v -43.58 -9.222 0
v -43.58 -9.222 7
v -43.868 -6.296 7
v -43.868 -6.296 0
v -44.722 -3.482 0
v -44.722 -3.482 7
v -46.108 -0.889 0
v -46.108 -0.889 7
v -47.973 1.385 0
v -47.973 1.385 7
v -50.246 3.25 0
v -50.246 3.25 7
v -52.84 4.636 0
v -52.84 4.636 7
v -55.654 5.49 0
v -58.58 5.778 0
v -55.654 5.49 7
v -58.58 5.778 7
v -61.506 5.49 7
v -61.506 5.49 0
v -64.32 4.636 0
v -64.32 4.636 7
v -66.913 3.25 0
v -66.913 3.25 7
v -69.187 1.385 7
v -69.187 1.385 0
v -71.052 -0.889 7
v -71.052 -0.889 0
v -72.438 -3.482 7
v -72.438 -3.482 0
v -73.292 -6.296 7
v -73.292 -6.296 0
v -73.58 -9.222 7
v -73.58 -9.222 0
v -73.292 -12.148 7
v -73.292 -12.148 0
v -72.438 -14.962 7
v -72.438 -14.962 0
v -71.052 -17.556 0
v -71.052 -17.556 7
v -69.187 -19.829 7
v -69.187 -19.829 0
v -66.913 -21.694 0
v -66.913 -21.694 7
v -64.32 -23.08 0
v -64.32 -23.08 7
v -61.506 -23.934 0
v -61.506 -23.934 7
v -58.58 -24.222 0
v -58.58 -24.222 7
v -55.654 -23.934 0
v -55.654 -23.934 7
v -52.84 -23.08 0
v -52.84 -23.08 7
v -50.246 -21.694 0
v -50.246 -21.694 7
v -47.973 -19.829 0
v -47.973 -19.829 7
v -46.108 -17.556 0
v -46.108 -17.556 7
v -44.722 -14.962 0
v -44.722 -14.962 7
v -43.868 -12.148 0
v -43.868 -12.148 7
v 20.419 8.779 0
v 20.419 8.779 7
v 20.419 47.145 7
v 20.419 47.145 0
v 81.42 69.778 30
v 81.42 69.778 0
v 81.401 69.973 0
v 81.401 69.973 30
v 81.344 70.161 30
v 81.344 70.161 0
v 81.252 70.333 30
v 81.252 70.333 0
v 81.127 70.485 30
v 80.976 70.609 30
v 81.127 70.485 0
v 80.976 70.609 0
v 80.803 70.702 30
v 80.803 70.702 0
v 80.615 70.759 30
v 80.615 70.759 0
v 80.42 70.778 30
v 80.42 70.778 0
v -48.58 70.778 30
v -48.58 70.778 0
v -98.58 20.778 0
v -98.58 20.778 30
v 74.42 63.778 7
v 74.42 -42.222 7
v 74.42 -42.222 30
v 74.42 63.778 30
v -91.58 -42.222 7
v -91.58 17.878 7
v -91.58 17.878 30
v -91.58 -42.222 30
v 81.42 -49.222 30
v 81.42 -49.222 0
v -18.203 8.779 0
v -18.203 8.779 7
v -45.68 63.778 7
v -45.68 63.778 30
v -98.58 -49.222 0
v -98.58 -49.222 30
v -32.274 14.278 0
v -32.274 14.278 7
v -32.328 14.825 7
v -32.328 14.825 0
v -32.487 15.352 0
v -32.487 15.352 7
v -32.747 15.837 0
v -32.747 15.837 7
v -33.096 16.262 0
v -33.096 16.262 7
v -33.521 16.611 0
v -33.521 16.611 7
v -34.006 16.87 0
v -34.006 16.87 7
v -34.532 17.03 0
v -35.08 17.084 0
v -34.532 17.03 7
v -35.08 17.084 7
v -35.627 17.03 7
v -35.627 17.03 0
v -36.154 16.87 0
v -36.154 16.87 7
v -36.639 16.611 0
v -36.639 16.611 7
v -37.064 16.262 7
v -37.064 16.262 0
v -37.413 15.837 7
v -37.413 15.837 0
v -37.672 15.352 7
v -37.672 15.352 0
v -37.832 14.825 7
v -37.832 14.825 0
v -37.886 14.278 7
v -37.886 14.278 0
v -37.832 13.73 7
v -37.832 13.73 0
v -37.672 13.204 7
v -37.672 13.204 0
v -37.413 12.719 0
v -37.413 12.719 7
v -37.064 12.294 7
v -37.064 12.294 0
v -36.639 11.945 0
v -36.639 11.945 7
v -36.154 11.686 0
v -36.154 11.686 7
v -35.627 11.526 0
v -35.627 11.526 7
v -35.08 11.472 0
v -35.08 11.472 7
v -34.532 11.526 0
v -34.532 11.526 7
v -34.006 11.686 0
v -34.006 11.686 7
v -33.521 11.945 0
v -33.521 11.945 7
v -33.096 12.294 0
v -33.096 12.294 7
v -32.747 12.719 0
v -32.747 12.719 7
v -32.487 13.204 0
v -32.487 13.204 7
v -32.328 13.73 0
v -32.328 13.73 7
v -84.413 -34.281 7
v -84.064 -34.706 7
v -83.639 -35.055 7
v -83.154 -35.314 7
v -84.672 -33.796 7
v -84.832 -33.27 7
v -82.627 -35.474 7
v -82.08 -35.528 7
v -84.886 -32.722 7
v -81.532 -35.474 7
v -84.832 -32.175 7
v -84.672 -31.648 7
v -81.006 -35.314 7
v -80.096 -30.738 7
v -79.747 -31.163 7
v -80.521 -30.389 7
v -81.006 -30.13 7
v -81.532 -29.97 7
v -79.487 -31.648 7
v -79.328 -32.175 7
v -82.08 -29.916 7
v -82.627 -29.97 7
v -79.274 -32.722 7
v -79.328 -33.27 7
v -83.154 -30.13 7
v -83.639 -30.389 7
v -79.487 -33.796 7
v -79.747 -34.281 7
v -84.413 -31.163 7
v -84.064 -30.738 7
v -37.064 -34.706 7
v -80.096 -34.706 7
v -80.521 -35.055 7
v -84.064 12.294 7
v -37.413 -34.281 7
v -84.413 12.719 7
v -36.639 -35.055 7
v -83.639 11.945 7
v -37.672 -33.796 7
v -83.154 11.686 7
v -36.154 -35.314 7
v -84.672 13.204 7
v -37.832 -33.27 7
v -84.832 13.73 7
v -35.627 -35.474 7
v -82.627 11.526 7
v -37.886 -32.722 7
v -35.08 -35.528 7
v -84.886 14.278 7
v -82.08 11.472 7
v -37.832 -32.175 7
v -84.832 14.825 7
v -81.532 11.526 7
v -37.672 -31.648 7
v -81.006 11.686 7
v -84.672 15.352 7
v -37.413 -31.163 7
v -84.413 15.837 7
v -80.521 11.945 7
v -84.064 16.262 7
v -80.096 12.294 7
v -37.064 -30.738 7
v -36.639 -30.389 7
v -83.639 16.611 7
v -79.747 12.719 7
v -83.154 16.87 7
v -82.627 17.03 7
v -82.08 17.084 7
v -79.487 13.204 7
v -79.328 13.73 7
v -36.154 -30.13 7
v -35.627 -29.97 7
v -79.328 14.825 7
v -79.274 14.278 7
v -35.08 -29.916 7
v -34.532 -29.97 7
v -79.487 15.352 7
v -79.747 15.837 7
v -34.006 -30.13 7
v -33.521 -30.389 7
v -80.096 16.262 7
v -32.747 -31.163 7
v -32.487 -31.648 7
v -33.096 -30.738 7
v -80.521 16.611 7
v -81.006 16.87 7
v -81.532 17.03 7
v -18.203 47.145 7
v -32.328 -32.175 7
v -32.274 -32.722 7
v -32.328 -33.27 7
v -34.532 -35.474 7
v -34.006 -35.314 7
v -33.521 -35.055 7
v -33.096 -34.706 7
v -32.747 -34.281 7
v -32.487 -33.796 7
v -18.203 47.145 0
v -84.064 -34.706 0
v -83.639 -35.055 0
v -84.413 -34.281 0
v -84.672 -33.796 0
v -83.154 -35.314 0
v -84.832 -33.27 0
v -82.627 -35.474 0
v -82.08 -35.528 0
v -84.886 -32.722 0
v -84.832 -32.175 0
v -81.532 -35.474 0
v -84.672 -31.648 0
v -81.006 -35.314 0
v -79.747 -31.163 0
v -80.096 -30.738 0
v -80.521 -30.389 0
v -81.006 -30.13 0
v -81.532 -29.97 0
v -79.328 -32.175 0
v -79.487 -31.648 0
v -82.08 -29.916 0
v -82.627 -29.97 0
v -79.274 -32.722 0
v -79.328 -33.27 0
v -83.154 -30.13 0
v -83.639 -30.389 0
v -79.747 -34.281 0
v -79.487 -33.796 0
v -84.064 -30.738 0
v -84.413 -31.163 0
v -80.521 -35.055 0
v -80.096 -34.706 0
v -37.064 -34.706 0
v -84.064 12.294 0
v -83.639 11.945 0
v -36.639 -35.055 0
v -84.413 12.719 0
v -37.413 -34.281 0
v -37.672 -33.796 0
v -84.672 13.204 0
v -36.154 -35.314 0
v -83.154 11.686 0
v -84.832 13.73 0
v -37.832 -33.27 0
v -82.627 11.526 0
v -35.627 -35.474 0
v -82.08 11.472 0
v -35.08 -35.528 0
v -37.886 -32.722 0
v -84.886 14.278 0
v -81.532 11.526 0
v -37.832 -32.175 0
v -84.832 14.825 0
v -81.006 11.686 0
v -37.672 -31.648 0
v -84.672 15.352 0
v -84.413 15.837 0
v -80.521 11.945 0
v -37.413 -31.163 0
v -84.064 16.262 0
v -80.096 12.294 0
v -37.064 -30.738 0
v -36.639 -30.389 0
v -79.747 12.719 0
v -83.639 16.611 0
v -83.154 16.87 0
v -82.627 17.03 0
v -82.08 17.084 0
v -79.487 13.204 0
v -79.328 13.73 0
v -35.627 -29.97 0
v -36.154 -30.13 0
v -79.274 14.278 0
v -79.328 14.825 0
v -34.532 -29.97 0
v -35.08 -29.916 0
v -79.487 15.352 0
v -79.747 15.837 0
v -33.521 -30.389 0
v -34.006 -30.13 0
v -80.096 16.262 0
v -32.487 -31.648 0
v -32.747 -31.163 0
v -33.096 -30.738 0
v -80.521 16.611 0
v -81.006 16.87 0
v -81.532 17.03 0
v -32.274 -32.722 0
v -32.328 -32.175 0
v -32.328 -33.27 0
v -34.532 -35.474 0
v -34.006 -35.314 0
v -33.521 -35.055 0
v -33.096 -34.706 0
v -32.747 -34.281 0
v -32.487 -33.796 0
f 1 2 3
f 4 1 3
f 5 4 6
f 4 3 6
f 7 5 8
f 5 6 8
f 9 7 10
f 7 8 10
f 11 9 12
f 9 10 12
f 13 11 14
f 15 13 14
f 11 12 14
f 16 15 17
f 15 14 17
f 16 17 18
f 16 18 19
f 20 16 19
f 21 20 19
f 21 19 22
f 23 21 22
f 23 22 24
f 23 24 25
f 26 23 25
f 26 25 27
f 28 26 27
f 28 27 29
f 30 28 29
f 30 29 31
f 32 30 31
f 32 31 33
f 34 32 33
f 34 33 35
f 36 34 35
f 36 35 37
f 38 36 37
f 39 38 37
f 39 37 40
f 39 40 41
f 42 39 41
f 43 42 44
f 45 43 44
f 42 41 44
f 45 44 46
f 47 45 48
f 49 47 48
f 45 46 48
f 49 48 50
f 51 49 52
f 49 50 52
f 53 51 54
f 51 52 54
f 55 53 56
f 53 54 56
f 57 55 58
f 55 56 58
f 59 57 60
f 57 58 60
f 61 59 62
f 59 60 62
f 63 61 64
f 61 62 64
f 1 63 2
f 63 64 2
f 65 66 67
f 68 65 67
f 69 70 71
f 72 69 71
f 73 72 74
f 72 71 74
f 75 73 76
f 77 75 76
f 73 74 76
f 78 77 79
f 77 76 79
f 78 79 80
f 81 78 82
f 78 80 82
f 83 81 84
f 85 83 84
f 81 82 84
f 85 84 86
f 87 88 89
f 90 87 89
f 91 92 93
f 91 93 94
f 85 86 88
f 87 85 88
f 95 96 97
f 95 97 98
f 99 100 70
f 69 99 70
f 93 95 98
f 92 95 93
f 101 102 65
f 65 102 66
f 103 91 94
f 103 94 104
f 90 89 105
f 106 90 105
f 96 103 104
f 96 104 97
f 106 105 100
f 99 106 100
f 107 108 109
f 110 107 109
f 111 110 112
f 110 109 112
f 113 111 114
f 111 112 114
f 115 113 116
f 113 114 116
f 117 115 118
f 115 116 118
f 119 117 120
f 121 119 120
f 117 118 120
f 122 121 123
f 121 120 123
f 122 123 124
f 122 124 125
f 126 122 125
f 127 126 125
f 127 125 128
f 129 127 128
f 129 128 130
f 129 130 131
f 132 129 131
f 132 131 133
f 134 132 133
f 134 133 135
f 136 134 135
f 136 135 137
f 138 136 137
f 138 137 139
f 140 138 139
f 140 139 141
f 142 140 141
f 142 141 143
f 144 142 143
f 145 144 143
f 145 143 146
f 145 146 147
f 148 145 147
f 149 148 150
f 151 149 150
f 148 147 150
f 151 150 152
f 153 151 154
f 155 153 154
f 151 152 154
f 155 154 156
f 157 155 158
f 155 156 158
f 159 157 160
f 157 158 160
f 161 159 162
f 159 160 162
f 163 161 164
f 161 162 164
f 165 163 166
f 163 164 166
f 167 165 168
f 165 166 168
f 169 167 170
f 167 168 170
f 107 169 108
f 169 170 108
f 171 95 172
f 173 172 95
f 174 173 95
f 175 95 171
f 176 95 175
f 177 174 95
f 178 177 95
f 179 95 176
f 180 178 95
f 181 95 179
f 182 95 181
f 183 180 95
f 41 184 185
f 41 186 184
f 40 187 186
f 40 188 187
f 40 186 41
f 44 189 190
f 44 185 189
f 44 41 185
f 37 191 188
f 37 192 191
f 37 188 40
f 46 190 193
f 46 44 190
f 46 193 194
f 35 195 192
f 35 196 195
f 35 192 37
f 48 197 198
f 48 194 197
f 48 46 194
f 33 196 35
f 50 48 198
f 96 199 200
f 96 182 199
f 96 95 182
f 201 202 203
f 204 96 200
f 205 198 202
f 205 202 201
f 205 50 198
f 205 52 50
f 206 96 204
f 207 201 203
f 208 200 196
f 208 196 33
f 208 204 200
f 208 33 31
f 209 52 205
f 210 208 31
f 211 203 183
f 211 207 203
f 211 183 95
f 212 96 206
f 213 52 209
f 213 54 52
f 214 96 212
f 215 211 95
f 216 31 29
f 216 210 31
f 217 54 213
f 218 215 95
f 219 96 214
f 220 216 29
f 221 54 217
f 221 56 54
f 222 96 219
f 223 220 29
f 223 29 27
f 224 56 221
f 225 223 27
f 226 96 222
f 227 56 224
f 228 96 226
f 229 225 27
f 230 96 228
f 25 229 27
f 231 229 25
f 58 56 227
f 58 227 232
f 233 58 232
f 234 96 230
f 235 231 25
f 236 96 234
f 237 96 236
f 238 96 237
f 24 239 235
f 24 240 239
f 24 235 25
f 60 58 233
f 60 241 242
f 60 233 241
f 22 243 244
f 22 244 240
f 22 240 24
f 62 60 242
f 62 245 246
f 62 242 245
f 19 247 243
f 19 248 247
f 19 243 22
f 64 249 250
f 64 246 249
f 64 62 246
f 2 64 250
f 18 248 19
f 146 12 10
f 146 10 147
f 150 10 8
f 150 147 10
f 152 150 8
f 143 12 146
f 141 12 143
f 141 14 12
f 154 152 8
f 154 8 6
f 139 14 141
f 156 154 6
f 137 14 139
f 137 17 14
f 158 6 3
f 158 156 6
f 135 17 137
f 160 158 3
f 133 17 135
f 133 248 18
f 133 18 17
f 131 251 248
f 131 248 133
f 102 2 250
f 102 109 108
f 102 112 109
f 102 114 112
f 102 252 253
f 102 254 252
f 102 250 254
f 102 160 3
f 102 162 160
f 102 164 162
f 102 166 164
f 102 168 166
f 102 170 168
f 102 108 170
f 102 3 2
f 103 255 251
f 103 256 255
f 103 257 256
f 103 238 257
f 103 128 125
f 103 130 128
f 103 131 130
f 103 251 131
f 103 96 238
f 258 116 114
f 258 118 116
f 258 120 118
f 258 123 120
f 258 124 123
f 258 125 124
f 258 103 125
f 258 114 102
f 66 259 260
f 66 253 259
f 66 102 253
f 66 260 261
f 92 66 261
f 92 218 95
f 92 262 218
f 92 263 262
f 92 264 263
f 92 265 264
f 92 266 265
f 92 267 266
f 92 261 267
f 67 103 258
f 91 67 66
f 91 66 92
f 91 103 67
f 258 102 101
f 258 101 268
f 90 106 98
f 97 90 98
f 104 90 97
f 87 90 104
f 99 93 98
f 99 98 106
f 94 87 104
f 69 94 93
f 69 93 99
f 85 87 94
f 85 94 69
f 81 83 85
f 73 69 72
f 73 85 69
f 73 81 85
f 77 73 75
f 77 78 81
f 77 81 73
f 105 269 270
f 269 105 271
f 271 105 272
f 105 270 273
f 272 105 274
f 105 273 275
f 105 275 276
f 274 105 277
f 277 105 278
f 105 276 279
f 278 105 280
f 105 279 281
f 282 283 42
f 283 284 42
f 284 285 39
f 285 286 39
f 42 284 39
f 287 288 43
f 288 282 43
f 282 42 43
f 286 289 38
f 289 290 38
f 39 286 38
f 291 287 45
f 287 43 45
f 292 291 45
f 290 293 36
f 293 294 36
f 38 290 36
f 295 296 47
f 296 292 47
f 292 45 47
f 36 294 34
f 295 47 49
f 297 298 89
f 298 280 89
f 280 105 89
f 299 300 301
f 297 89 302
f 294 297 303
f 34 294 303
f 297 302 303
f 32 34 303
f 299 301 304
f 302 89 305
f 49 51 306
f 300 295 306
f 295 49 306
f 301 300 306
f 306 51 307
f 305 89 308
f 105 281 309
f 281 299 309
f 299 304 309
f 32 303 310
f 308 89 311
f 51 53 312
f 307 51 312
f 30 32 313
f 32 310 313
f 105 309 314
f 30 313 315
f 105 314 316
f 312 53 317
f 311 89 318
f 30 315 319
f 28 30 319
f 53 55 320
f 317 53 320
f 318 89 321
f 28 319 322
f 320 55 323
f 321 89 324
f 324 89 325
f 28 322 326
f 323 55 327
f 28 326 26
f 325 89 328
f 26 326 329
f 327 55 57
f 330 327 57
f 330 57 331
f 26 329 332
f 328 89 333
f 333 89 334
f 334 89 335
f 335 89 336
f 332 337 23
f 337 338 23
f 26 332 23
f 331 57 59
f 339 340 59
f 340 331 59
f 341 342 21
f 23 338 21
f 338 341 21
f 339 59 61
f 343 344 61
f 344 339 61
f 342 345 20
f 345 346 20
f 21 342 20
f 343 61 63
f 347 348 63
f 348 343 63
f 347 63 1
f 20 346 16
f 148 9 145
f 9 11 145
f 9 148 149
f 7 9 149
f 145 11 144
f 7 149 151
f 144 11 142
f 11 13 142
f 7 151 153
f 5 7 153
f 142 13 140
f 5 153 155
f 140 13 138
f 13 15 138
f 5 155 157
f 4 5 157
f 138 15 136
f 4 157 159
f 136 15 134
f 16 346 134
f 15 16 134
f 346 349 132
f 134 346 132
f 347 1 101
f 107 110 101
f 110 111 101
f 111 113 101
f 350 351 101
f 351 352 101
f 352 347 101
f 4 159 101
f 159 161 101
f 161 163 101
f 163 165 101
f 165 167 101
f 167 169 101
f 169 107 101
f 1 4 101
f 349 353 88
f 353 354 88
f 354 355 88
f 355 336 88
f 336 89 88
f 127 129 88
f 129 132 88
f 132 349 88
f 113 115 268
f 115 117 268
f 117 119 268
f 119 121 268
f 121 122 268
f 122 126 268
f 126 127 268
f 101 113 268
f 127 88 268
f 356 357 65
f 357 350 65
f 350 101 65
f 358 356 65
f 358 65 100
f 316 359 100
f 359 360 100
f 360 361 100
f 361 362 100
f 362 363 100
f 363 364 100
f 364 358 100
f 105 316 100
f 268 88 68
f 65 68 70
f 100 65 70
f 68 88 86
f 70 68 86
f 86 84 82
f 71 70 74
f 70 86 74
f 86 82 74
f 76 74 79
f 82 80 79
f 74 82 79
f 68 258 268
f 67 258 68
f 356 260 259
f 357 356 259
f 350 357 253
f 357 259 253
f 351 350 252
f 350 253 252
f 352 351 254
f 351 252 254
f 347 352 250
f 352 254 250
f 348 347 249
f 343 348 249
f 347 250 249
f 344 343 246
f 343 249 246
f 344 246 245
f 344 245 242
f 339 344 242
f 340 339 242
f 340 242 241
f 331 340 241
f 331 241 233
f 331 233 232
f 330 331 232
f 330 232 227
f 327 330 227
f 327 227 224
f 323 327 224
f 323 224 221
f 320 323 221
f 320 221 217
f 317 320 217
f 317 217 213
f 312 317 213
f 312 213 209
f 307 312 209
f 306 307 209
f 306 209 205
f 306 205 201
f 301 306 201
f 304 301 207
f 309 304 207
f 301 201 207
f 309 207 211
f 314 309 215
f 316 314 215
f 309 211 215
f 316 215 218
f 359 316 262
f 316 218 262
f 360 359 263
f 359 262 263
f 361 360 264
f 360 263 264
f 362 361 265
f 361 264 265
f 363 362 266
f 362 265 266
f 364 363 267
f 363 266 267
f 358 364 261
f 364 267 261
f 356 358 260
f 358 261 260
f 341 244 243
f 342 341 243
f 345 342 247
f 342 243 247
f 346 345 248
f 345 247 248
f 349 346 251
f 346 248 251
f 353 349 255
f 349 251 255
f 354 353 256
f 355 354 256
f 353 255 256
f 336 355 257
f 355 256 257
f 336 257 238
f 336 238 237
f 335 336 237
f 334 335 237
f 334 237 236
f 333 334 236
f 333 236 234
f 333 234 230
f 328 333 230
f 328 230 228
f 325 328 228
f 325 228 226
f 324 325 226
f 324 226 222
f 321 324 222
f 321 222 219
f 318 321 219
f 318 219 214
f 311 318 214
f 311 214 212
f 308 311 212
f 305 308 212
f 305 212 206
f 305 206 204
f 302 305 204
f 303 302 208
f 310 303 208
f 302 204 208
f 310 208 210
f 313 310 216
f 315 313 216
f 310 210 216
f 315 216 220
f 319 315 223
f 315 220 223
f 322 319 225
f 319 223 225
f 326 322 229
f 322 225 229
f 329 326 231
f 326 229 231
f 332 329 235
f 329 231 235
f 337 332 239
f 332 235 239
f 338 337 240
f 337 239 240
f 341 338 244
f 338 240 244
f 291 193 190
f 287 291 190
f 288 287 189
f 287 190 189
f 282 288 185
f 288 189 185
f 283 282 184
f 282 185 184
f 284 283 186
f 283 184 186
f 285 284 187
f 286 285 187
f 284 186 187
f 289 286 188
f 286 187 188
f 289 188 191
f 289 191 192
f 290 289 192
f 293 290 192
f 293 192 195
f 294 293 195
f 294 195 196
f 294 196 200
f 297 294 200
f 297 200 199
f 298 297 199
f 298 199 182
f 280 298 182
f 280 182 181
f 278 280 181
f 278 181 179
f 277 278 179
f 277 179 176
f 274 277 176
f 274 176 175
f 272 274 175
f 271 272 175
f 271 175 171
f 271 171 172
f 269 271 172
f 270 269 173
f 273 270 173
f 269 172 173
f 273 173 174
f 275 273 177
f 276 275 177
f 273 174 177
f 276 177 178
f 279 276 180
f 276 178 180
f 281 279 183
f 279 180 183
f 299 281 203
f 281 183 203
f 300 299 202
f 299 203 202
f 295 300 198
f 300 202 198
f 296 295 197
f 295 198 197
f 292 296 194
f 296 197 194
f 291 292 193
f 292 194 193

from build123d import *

# Parameters (mm, degrees)
BOSS_EXTRUDE1_DEPTH  = 30
SHELL1_T             = -7
SKETCH2_R            = 15
CUT_EXTRUDE1_DEPTH   = 20
SKETCH3_R            = 2.805999004
CUT_EXTRUDE2_DEPTH   = 20
LPATTERN1_COUNT      = 2
LPATTERN1_PITCH      = 47
LPATTERN1_COUNT_DIR2 = 2
LPATTERN1_PITCH_DIR2 = 47
SKETCH4_W            = 38.622861656
SKETCH4_H            = 38.365375911
CUT_EXTRUDE3_DEPTH   = 20


with BuildPart() as part:
    # Sketch1 → Boss-Extrude1 (new body)
    with BuildSketch(Plane.XY):
        with BuildLine():
            Line((-48.579903717, 70.777906396), (-98.579903717, 20.777906396))
            Line((-98.579903717, 20.777906396), (-98.579903717, -49.222093604))
            Line((-98.579903717, -49.222093604), (81.420096283, -49.222093604))
            Line((81.420096283, -49.222093604), (81.420096283, 69.777906396))
            ThreePointArc((81.420096283, 69.777906396), (81.127203064, 70.485013177), (80.420096283, 70.777906396))
            Line((80.420096283, 70.777906396), (-48.579903717, 70.777906396))
        make_face()
    extrude(amount=BOSS_EXTRUDE1_DEPTH)

    # Shell1
    shell1_openings = [part.faces().sort_by_distance(p)[0] for p in [
        (-4.076298463, 8.11549528, 30),
    ]]
    offset(amount=SHELL1_T, openings=shell1_openings, kind=Kind.INTERSECTION)

    # Sketch2 → Cut-Extrude1 (cut)
    with BuildSketch(Plane.XY.offset(7)):
        with Locations((-58.579903717, -9.222093604)):
            Circle(SKETCH2_R)
    extrude(amount=-CUT_EXTRUDE1_DEPTH, mode=Mode.SUBTRACT)

    # Sketch3 → Cut-Extrude2 (cut)
    with BuildSketch(Plane.XY.offset(7)):
        with Locations((-82.079903717, 14.277906396)):
            Circle(SKETCH3_R)
    cut_extrude2 = extrude(amount=-CUT_EXTRUDE2_DEPTH, mode=Mode.SUBTRACT)

    # LPattern1: Cut-Extrude2 2 × 2
    with Locations(*[(i * LPATTERN1_PITCH, -j * LPATTERN1_PITCH_DIR2, 0) for i in range(LPATTERN1_COUNT) for j in range(LPATTERN1_COUNT_DIR2) if (i, j) != (0, 0)]):
        add(cut_extrude2, mode=Mode.SUBTRACT)

    # Sketch4 → Cut-Extrude3 (cut)
    with BuildSketch(Plane.XY.offset(7)):
        with Locations((1.108051651, 27.962073286)):
            Rectangle(SKETCH4_W, SKETCH4_H)
    extrude(amount=-CUT_EXTRUDE3_DEPTH, mode=Mode.SUBTRACT)


solid = part.part
